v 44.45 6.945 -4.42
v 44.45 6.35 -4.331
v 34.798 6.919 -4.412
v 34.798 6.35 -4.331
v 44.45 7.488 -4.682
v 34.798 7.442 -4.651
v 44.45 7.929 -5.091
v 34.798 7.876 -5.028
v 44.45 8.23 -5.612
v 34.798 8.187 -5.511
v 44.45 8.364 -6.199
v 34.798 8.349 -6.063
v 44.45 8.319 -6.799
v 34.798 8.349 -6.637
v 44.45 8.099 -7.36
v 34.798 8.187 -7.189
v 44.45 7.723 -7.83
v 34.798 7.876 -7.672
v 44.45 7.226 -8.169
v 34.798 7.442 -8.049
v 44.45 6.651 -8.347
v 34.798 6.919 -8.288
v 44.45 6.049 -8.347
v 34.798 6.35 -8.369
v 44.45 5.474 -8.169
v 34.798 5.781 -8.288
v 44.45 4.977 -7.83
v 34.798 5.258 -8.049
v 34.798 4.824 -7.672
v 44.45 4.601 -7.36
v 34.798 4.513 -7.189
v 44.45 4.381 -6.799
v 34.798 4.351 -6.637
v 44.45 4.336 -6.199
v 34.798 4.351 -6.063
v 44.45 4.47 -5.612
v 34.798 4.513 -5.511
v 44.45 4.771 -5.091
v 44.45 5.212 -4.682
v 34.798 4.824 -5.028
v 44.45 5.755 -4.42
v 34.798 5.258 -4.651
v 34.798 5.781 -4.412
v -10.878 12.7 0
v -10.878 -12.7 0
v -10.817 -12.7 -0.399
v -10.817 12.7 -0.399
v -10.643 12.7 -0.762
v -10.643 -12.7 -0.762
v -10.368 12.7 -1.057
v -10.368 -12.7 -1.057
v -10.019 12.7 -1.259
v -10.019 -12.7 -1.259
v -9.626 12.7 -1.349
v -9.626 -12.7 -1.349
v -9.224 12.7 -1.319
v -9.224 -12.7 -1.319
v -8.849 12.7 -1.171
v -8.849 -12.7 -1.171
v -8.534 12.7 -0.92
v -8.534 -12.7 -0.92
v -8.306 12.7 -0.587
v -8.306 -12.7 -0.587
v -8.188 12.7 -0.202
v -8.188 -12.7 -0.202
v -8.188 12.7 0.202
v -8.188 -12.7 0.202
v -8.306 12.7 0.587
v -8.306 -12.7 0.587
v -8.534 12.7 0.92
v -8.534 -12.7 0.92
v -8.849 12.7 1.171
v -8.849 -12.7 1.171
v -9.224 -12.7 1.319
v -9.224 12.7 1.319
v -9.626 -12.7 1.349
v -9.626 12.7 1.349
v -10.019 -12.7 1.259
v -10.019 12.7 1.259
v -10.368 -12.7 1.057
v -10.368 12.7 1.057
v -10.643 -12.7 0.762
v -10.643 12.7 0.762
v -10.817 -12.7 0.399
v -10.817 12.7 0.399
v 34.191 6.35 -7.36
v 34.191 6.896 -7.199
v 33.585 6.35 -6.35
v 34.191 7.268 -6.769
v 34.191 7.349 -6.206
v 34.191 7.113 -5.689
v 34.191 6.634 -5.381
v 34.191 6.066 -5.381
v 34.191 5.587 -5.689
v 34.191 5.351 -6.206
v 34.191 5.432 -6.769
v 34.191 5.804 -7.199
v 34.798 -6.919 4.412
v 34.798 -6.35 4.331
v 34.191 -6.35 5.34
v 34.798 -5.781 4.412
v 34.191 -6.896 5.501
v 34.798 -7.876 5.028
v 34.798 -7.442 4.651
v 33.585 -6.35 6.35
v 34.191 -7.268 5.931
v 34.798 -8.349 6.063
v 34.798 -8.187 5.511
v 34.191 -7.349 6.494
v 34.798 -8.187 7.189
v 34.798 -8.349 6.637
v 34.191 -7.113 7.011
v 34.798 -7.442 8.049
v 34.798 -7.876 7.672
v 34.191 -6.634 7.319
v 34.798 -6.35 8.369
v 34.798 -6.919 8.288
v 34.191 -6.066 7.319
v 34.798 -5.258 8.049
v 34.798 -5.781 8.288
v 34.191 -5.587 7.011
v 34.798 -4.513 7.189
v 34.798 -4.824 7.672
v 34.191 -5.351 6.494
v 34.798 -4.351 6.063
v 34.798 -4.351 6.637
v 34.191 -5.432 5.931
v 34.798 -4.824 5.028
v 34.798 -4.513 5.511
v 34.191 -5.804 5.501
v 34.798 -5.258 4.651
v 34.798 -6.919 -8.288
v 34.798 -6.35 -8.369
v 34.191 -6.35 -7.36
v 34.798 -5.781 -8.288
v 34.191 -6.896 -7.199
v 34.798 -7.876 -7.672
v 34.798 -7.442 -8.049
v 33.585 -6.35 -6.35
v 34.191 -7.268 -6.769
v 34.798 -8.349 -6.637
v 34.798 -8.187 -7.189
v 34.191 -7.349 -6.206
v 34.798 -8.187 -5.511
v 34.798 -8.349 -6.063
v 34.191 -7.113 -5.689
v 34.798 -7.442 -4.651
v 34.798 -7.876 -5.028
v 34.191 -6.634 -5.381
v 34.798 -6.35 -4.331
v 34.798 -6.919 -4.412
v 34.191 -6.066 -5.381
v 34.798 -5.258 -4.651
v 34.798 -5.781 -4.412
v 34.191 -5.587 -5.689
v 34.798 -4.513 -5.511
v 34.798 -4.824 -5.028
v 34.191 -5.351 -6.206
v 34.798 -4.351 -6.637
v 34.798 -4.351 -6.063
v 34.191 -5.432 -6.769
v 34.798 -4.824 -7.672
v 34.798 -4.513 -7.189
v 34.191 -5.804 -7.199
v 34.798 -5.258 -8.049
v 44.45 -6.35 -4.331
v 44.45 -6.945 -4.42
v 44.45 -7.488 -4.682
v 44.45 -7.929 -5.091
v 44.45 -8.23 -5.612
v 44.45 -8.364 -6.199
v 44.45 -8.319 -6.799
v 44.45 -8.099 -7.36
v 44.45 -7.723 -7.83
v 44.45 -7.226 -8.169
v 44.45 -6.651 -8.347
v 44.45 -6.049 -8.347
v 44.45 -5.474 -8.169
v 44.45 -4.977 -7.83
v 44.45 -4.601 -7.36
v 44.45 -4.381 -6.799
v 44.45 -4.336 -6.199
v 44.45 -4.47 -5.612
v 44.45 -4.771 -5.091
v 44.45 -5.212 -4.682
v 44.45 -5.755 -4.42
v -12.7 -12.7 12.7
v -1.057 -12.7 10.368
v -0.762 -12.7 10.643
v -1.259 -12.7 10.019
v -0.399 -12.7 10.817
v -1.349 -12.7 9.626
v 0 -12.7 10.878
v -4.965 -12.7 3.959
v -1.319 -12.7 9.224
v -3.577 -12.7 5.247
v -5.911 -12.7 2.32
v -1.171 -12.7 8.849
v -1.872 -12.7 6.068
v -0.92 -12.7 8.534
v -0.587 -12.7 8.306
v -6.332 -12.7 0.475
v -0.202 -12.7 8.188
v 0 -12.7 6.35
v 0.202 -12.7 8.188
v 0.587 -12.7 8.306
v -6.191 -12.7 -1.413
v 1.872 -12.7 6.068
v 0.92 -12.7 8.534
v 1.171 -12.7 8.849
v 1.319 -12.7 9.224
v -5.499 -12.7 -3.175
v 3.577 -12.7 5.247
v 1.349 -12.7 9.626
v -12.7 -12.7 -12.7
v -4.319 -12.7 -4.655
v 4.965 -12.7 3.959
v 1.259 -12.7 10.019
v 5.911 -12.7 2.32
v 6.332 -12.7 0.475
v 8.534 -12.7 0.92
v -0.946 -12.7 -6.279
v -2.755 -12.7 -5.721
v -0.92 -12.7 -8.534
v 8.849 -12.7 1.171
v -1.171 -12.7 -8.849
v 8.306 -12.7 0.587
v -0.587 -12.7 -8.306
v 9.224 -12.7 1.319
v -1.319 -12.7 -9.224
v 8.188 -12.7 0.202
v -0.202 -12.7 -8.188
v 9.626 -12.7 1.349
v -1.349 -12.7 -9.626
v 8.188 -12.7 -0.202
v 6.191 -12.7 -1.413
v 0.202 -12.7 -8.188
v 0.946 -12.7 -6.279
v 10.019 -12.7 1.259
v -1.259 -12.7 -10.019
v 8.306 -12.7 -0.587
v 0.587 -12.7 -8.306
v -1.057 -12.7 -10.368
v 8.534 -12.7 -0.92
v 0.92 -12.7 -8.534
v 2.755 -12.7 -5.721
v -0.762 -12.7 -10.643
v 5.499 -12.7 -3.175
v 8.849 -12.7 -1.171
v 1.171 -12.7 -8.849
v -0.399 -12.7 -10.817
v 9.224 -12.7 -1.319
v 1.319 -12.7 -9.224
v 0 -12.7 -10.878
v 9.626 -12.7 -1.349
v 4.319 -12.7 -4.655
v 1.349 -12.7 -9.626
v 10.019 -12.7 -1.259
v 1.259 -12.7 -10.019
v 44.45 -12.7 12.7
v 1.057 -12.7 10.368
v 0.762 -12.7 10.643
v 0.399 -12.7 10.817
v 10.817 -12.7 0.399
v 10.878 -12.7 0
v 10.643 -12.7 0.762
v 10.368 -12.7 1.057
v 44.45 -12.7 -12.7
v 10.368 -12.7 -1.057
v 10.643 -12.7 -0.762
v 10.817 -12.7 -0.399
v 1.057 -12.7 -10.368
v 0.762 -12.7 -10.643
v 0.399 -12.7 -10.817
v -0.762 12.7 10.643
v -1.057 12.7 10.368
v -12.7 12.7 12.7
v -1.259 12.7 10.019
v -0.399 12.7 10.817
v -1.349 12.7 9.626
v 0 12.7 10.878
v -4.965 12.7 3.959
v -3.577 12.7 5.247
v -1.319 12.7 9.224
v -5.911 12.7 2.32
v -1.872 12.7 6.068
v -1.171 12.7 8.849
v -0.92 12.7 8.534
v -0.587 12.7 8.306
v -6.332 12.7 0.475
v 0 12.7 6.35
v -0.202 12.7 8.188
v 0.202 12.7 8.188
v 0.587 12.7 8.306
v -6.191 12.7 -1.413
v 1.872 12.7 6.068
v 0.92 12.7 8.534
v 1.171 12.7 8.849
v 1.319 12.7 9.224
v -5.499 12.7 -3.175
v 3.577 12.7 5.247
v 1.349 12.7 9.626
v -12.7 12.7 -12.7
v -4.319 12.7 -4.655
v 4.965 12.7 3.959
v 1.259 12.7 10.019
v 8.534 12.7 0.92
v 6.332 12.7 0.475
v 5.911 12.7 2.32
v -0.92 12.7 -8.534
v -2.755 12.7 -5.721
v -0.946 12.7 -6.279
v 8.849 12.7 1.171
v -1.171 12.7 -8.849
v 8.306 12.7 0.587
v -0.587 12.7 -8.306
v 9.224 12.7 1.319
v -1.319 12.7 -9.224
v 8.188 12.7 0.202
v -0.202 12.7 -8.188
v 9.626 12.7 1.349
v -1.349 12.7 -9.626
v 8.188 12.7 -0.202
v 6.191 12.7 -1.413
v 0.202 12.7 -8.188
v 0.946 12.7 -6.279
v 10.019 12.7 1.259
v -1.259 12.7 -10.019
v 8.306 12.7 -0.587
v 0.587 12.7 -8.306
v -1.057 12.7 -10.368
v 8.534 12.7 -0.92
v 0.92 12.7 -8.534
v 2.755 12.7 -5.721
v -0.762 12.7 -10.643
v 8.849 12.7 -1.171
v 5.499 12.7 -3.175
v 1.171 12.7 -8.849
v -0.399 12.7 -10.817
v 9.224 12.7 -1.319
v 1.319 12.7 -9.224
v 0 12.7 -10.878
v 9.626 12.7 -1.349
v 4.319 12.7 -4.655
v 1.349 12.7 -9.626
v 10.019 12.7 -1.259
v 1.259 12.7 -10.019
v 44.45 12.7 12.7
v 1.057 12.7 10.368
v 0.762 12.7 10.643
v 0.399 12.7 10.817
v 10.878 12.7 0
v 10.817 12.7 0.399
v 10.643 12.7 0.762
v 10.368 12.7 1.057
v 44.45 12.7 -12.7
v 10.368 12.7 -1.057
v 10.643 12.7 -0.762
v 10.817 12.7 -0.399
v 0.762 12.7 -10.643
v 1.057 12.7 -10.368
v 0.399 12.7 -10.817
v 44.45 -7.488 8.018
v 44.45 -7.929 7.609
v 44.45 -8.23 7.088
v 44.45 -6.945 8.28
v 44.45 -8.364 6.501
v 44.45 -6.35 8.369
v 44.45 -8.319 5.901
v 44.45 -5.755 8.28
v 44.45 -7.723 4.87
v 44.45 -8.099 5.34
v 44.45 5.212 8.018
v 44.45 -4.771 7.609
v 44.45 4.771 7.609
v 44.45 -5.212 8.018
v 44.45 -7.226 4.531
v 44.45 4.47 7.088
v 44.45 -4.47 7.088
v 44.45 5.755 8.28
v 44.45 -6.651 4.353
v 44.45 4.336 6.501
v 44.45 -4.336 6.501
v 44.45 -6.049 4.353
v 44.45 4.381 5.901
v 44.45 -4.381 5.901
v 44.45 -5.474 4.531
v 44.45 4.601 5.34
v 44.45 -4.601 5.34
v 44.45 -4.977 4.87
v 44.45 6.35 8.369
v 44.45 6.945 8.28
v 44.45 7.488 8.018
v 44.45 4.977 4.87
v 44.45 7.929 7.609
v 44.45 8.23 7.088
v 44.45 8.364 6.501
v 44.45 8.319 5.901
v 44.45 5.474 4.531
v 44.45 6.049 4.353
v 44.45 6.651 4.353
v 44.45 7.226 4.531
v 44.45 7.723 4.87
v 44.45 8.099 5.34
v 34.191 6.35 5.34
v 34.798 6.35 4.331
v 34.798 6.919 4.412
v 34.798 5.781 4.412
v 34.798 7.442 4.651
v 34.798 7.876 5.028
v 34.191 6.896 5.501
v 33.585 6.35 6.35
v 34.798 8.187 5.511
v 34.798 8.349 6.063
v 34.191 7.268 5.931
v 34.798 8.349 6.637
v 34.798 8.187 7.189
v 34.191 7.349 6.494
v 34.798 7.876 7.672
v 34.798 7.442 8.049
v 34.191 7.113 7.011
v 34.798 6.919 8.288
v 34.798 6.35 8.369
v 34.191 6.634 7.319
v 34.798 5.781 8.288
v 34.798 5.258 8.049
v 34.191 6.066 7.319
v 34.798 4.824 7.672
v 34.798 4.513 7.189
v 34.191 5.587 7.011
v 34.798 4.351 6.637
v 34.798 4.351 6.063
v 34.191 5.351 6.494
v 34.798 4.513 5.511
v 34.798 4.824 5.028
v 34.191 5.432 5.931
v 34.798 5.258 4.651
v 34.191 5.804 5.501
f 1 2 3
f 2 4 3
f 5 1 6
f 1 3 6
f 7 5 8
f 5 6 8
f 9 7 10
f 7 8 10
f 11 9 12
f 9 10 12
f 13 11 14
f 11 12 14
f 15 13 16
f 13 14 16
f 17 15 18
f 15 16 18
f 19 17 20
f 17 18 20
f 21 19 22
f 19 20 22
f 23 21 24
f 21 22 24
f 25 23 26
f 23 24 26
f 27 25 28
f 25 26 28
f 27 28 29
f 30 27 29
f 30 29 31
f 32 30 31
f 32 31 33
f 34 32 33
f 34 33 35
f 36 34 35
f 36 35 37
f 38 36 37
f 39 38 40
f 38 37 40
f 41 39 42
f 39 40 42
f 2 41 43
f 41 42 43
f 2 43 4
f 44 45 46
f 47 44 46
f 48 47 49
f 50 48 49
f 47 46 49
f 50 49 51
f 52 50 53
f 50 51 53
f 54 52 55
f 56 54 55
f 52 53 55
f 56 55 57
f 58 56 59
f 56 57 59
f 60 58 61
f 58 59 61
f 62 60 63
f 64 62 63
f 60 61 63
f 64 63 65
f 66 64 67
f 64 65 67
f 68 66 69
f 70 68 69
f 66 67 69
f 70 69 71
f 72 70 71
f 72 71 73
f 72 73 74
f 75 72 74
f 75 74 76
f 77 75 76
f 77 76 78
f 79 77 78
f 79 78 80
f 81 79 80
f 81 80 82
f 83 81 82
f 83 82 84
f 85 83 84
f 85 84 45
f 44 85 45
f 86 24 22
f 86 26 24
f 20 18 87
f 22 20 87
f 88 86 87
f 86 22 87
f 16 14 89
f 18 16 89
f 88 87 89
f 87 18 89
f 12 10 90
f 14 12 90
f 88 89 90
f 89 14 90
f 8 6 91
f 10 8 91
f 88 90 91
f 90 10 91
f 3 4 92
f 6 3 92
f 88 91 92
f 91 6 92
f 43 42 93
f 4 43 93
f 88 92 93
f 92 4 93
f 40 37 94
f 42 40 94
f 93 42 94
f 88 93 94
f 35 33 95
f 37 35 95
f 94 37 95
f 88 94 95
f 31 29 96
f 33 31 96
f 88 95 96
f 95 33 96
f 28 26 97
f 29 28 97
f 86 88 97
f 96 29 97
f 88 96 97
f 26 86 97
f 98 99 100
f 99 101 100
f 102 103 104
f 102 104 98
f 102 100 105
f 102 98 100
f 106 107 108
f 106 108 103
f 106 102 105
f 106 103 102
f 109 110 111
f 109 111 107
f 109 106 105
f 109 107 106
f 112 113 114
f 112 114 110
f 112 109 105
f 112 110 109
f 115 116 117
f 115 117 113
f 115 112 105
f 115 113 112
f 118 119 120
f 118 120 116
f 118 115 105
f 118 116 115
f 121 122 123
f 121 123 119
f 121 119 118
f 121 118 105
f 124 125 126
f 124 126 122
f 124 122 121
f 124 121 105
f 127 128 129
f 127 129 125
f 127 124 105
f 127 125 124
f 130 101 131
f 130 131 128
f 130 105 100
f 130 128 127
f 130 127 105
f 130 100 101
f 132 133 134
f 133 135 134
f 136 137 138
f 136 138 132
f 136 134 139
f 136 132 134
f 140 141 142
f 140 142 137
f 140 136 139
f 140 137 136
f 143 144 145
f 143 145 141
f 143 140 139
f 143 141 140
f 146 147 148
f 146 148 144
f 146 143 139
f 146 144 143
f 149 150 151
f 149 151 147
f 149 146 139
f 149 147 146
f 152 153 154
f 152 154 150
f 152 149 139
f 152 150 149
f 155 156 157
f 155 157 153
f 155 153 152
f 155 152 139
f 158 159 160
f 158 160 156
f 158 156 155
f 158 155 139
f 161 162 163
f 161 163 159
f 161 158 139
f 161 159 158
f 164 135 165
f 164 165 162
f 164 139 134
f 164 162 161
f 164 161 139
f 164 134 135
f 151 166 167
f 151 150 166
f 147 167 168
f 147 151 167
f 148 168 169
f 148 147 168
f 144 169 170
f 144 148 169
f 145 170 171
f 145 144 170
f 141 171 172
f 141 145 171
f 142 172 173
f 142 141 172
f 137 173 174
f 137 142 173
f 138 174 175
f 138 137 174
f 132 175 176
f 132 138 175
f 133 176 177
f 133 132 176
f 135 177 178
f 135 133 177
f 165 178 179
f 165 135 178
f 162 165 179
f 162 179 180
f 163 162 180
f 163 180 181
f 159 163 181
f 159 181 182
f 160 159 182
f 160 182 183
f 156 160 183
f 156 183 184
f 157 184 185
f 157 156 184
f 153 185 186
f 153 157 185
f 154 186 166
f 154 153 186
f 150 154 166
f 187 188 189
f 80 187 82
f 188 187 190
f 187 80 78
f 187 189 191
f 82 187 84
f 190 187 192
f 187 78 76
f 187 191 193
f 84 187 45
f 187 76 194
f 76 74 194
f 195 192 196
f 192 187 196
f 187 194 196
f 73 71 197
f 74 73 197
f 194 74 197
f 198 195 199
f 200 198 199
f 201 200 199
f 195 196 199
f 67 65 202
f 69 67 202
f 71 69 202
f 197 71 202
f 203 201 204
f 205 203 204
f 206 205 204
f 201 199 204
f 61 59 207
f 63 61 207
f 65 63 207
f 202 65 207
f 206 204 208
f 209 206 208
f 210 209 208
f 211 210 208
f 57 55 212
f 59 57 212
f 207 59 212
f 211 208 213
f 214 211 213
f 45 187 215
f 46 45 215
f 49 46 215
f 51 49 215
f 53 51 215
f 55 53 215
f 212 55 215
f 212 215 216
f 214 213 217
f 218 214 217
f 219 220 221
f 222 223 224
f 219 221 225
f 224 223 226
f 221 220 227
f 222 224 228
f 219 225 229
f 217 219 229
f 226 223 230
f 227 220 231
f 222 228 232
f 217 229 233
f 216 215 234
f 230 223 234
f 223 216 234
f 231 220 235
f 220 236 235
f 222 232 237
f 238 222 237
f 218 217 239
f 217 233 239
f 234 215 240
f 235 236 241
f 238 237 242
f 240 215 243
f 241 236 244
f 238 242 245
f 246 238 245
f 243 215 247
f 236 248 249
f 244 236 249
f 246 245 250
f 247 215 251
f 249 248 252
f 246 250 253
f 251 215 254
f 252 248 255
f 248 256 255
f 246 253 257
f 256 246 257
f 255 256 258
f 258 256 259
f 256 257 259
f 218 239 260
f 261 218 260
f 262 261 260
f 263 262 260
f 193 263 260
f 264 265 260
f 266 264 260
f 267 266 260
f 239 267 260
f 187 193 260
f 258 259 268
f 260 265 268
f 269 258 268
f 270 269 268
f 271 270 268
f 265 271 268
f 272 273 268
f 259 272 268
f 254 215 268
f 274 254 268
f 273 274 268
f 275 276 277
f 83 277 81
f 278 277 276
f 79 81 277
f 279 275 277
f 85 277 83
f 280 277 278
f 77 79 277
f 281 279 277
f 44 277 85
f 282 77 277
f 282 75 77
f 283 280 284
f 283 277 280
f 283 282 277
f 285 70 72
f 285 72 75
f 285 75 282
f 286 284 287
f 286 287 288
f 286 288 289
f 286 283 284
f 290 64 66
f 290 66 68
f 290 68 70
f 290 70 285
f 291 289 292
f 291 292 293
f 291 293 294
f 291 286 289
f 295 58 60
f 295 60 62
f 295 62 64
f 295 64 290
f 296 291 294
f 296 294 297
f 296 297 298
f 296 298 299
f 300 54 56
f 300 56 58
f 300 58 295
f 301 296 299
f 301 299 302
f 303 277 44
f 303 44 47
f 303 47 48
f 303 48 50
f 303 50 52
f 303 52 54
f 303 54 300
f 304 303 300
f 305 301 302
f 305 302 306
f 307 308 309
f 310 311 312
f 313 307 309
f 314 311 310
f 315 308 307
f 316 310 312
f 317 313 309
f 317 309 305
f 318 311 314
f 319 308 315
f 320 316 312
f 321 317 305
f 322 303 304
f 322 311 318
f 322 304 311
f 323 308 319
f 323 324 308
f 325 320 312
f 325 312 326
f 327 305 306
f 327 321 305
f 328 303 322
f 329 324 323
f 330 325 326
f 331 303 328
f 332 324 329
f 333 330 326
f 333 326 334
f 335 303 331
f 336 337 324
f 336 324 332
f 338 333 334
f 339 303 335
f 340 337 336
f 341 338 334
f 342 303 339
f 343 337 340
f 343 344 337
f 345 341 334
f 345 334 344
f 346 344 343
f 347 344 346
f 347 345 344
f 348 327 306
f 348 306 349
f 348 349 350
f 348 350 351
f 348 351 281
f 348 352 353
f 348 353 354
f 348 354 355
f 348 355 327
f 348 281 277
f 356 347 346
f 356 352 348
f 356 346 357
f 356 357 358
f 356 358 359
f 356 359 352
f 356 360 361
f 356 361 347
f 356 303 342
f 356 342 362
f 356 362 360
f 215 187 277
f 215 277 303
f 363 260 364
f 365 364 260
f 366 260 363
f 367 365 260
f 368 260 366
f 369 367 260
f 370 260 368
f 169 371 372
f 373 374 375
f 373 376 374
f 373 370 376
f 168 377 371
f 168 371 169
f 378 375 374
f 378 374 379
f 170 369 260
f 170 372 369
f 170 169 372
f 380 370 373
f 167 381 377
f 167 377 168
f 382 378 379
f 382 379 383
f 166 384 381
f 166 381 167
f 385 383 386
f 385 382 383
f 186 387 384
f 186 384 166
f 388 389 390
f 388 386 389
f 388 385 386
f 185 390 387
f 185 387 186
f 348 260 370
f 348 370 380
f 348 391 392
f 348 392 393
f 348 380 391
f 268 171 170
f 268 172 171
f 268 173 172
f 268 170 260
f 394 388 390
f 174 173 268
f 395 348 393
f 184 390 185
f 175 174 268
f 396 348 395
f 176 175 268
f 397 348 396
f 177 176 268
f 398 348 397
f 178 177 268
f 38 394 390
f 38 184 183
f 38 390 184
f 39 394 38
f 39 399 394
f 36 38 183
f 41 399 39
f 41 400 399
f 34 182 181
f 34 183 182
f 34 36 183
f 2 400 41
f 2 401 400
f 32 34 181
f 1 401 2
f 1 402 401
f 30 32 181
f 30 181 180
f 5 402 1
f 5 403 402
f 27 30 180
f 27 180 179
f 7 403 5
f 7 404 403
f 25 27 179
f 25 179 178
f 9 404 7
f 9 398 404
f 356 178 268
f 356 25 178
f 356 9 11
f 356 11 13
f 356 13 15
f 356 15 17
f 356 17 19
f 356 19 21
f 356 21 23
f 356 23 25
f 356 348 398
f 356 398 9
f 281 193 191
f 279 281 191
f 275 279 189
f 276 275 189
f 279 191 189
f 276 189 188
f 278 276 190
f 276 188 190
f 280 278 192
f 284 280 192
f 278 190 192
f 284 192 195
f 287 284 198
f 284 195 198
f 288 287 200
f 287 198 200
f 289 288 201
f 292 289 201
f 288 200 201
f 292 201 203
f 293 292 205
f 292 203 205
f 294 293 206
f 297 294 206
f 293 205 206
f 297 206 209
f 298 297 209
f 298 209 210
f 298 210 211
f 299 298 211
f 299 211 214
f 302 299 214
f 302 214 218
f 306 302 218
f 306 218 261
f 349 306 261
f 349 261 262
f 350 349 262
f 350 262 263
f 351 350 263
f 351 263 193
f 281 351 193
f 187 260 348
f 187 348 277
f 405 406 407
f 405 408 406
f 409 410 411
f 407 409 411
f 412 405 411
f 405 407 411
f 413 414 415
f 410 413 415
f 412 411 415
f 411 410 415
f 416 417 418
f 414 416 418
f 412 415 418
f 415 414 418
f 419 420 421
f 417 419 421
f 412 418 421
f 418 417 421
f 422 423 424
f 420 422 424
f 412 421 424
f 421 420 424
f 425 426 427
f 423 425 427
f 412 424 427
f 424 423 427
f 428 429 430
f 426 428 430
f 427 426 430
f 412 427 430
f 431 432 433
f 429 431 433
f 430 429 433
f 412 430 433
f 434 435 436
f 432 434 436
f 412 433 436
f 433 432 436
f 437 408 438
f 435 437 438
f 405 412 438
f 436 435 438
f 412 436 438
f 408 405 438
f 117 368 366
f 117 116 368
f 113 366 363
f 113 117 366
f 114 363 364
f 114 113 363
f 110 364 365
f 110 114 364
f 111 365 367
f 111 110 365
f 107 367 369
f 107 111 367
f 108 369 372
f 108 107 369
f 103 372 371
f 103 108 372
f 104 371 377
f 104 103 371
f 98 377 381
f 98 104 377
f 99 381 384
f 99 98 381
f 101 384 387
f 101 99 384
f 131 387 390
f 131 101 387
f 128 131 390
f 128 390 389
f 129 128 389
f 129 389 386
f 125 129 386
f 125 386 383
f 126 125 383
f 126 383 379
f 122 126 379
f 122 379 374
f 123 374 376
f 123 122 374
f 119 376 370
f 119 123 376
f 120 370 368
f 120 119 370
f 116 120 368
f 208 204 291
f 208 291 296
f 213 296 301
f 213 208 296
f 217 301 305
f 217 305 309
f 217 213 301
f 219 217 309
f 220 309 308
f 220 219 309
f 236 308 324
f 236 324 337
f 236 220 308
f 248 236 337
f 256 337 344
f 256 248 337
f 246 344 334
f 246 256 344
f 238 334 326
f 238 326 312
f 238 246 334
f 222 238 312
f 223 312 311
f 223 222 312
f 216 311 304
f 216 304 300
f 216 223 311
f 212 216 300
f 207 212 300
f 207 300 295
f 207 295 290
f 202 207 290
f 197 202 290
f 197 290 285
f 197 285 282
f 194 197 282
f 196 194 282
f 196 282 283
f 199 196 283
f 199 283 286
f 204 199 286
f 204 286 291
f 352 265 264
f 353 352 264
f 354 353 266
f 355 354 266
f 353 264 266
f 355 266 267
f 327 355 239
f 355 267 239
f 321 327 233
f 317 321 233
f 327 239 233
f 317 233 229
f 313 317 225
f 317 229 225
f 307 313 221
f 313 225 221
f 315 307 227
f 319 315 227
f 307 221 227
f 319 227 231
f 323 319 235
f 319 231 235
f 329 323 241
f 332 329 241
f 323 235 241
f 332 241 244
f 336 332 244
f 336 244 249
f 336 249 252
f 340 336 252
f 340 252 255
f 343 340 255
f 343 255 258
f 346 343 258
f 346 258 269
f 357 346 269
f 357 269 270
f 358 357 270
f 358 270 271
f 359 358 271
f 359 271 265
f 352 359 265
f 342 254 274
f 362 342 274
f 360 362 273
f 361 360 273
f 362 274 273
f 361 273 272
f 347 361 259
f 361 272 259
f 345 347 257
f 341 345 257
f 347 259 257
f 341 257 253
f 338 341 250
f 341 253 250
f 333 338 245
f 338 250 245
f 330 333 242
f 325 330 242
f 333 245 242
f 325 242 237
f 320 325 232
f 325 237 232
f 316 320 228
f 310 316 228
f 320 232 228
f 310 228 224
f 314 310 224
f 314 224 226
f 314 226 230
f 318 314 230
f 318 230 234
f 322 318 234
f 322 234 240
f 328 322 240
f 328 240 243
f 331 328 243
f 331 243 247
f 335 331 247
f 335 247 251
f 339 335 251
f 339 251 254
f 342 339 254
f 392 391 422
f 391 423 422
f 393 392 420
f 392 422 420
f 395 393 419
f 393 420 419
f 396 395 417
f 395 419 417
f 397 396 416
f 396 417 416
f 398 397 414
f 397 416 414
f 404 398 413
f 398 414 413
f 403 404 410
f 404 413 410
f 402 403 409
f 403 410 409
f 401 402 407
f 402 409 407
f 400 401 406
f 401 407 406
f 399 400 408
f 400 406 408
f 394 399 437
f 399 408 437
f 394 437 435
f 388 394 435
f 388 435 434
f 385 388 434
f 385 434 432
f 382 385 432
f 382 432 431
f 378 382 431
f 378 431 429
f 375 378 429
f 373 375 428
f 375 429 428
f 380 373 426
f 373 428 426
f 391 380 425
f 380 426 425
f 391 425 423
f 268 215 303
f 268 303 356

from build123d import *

# Parameters (mm, degrees)
SKETCH1_W                  = 88.9
SKETCH1_H                  = 76.2
BOSS_EXTRUDE1_DEPTH        = 12.7
SKETCH9_R                  = 6.35
CUT_EXTRUDE2_DEPTH         = 60.905780189
FILLET1_R                  = 38.1
F_10_32_TAPPED_HOLE1_D     = 4.0386
F_10_32_TAPPED_HOLE1_DEPTH = 9.652
F_10_32_TAPPED_HOLE1_TIP   = 1.213317848
CUT_EXTRUDE3_DEPTH         = 60.905780189
F_6_32_TAPPED_HOLE1_D      = 2.7051
CIRPATTERN1_COUNT          = 4


with BuildPart() as part:
    # Sketch1 → Boss-Extrude1 (new body)
    with BuildSketch(Plane(origin=(0, 0, 0), x_dir=(1, 0, 0), z_dir=(0, 1, 0))):
        Rectangle(SKETCH1_W, SKETCH1_H)
    extrude(amount=BOSS_EXTRUDE1_DEPTH)

    # Sketch9 → Cut-Extrude2 (cut, through all)
    with BuildSketch(Plane(origin=(0, 12.7, 0), x_dir=(1, 0, 0), z_dir=(0, 1, 0))):
        with Locations(Location((0, 0, 0), (0, 0, 270))):
            Circle(SKETCH9_R)
    extrude(amount=-CUT_EXTRUDE2_DEPTH, mode=Mode.SUBTRACT)

    # Fillet1
    fillet1_edges = [part.edges().sort_by_distance(p)[0] for p in [
        (-44.45, 6.35, -38.1),
        (-44.45, 6.35, 38.1),
    ]]
    fillet(fillet1_edges, radius=FILLET1_R - 0.0001)  # a hair under: the kernel refuses the full size

    # #10-32 Tapped Hole1
    with Locations(Plane(origin=(44.45, 0, 0), x_dir=(0, 0, -1), z_dir=(1, 0, 0))):
        with Locations((-6.35, 6.35), (6.35, 6.35)):
            Hole(F_10_32_TAPPED_HOLE1_D / 2, depth=F_10_32_TAPPED_HOLE1_DEPTH)
            with Locations((0, 0, -(F_10_32_TAPPED_HOLE1_DEPTH + F_10_32_TAPPED_HOLE1_TIP / 2))):  # 118° drill point
                Cone(0, F_10_32_TAPPED_HOLE1_D / 2, F_10_32_TAPPED_HOLE1_TIP, mode=Mode.SUBTRACT)

    # Sketch13 → Cut-Extrude3 (cut, through all)
    with BuildSketch(Plane(origin=(0, 12.7, 0), x_dir=(1, 0, 0), z_dir=(0, 1, 0))):
        with BuildLine():
            Line((-12.7, 12.7), (44.45, 12.7))
            Line((44.45, 12.7), (44.45, 38.1))
            Line((44.45, 38.1), (-6.35, 38.1))
            ThreePointArc((-6.35, 38.1), (-33.290768363, 26.940768363), (-44.45, 0))
            ThreePointArc((-44.45, 0), (-33.290768363, -26.940768363), (-6.35, -38.1))
            Line((-6.35, -38.1), (44.45, -38.1))
            Line((44.45, -38.1), (44.45, -12.7))
            Line((44.45, -12.7), (-12.7, -12.7))
            Line((-12.7, -12.7), (-12.7, 12.7))
        make_face()
    extrude(amount=-CUT_EXTRUDE3_DEPTH, mode=Mode.SUBTRACT)


with BuildPart() as cut_extrude3_kept_piece:
    # of the separate pieces the step leaves, the one the design keeps (cut_extrude3_pieces_kept)
    add(part.part.solids().sort_by_distance((44.45, 12.7, 12.7))[0])

    # Mirror2: Cut-Extrude3 kept piece across plane


with BuildPart() as cut_extrude3_kept_piece_1:
    add(cut_extrude3_kept_piece.part)
    add(cut_extrude3_kept_piece.part.mirror(Plane(origin=(0, 0, 0), x_dir=(0, 0, 1), z_dir=(0, -1, 0))))

    # #6-32 Tapped Hole1 (through all)
    with Locations(Plane(origin=(0, 12.7, 0), x_dir=(1, 0, 0), z_dir=(0, 1, 0))):
        with Locations((-9.525, 0)):
            f_6_32_tapped_hole1 = Hole(F_6_32_TAPPED_HOLE1_D / 2)

    # CirPattern1: #6-32 Tapped Hole1 ×4 about axis
    cirpattern1_axis = Axis((0, 0, 0), (0, 1, 0))
    for i in range(1, CIRPATTERN1_COUNT):
        add(f_6_32_tapped_hole1.rotate(cirpattern1_axis, i * 360 / CIRPATTERN1_COUNT), mode=Mode.SUBTRACT)


solid = cut_extrude3_kept_piece_1.part
